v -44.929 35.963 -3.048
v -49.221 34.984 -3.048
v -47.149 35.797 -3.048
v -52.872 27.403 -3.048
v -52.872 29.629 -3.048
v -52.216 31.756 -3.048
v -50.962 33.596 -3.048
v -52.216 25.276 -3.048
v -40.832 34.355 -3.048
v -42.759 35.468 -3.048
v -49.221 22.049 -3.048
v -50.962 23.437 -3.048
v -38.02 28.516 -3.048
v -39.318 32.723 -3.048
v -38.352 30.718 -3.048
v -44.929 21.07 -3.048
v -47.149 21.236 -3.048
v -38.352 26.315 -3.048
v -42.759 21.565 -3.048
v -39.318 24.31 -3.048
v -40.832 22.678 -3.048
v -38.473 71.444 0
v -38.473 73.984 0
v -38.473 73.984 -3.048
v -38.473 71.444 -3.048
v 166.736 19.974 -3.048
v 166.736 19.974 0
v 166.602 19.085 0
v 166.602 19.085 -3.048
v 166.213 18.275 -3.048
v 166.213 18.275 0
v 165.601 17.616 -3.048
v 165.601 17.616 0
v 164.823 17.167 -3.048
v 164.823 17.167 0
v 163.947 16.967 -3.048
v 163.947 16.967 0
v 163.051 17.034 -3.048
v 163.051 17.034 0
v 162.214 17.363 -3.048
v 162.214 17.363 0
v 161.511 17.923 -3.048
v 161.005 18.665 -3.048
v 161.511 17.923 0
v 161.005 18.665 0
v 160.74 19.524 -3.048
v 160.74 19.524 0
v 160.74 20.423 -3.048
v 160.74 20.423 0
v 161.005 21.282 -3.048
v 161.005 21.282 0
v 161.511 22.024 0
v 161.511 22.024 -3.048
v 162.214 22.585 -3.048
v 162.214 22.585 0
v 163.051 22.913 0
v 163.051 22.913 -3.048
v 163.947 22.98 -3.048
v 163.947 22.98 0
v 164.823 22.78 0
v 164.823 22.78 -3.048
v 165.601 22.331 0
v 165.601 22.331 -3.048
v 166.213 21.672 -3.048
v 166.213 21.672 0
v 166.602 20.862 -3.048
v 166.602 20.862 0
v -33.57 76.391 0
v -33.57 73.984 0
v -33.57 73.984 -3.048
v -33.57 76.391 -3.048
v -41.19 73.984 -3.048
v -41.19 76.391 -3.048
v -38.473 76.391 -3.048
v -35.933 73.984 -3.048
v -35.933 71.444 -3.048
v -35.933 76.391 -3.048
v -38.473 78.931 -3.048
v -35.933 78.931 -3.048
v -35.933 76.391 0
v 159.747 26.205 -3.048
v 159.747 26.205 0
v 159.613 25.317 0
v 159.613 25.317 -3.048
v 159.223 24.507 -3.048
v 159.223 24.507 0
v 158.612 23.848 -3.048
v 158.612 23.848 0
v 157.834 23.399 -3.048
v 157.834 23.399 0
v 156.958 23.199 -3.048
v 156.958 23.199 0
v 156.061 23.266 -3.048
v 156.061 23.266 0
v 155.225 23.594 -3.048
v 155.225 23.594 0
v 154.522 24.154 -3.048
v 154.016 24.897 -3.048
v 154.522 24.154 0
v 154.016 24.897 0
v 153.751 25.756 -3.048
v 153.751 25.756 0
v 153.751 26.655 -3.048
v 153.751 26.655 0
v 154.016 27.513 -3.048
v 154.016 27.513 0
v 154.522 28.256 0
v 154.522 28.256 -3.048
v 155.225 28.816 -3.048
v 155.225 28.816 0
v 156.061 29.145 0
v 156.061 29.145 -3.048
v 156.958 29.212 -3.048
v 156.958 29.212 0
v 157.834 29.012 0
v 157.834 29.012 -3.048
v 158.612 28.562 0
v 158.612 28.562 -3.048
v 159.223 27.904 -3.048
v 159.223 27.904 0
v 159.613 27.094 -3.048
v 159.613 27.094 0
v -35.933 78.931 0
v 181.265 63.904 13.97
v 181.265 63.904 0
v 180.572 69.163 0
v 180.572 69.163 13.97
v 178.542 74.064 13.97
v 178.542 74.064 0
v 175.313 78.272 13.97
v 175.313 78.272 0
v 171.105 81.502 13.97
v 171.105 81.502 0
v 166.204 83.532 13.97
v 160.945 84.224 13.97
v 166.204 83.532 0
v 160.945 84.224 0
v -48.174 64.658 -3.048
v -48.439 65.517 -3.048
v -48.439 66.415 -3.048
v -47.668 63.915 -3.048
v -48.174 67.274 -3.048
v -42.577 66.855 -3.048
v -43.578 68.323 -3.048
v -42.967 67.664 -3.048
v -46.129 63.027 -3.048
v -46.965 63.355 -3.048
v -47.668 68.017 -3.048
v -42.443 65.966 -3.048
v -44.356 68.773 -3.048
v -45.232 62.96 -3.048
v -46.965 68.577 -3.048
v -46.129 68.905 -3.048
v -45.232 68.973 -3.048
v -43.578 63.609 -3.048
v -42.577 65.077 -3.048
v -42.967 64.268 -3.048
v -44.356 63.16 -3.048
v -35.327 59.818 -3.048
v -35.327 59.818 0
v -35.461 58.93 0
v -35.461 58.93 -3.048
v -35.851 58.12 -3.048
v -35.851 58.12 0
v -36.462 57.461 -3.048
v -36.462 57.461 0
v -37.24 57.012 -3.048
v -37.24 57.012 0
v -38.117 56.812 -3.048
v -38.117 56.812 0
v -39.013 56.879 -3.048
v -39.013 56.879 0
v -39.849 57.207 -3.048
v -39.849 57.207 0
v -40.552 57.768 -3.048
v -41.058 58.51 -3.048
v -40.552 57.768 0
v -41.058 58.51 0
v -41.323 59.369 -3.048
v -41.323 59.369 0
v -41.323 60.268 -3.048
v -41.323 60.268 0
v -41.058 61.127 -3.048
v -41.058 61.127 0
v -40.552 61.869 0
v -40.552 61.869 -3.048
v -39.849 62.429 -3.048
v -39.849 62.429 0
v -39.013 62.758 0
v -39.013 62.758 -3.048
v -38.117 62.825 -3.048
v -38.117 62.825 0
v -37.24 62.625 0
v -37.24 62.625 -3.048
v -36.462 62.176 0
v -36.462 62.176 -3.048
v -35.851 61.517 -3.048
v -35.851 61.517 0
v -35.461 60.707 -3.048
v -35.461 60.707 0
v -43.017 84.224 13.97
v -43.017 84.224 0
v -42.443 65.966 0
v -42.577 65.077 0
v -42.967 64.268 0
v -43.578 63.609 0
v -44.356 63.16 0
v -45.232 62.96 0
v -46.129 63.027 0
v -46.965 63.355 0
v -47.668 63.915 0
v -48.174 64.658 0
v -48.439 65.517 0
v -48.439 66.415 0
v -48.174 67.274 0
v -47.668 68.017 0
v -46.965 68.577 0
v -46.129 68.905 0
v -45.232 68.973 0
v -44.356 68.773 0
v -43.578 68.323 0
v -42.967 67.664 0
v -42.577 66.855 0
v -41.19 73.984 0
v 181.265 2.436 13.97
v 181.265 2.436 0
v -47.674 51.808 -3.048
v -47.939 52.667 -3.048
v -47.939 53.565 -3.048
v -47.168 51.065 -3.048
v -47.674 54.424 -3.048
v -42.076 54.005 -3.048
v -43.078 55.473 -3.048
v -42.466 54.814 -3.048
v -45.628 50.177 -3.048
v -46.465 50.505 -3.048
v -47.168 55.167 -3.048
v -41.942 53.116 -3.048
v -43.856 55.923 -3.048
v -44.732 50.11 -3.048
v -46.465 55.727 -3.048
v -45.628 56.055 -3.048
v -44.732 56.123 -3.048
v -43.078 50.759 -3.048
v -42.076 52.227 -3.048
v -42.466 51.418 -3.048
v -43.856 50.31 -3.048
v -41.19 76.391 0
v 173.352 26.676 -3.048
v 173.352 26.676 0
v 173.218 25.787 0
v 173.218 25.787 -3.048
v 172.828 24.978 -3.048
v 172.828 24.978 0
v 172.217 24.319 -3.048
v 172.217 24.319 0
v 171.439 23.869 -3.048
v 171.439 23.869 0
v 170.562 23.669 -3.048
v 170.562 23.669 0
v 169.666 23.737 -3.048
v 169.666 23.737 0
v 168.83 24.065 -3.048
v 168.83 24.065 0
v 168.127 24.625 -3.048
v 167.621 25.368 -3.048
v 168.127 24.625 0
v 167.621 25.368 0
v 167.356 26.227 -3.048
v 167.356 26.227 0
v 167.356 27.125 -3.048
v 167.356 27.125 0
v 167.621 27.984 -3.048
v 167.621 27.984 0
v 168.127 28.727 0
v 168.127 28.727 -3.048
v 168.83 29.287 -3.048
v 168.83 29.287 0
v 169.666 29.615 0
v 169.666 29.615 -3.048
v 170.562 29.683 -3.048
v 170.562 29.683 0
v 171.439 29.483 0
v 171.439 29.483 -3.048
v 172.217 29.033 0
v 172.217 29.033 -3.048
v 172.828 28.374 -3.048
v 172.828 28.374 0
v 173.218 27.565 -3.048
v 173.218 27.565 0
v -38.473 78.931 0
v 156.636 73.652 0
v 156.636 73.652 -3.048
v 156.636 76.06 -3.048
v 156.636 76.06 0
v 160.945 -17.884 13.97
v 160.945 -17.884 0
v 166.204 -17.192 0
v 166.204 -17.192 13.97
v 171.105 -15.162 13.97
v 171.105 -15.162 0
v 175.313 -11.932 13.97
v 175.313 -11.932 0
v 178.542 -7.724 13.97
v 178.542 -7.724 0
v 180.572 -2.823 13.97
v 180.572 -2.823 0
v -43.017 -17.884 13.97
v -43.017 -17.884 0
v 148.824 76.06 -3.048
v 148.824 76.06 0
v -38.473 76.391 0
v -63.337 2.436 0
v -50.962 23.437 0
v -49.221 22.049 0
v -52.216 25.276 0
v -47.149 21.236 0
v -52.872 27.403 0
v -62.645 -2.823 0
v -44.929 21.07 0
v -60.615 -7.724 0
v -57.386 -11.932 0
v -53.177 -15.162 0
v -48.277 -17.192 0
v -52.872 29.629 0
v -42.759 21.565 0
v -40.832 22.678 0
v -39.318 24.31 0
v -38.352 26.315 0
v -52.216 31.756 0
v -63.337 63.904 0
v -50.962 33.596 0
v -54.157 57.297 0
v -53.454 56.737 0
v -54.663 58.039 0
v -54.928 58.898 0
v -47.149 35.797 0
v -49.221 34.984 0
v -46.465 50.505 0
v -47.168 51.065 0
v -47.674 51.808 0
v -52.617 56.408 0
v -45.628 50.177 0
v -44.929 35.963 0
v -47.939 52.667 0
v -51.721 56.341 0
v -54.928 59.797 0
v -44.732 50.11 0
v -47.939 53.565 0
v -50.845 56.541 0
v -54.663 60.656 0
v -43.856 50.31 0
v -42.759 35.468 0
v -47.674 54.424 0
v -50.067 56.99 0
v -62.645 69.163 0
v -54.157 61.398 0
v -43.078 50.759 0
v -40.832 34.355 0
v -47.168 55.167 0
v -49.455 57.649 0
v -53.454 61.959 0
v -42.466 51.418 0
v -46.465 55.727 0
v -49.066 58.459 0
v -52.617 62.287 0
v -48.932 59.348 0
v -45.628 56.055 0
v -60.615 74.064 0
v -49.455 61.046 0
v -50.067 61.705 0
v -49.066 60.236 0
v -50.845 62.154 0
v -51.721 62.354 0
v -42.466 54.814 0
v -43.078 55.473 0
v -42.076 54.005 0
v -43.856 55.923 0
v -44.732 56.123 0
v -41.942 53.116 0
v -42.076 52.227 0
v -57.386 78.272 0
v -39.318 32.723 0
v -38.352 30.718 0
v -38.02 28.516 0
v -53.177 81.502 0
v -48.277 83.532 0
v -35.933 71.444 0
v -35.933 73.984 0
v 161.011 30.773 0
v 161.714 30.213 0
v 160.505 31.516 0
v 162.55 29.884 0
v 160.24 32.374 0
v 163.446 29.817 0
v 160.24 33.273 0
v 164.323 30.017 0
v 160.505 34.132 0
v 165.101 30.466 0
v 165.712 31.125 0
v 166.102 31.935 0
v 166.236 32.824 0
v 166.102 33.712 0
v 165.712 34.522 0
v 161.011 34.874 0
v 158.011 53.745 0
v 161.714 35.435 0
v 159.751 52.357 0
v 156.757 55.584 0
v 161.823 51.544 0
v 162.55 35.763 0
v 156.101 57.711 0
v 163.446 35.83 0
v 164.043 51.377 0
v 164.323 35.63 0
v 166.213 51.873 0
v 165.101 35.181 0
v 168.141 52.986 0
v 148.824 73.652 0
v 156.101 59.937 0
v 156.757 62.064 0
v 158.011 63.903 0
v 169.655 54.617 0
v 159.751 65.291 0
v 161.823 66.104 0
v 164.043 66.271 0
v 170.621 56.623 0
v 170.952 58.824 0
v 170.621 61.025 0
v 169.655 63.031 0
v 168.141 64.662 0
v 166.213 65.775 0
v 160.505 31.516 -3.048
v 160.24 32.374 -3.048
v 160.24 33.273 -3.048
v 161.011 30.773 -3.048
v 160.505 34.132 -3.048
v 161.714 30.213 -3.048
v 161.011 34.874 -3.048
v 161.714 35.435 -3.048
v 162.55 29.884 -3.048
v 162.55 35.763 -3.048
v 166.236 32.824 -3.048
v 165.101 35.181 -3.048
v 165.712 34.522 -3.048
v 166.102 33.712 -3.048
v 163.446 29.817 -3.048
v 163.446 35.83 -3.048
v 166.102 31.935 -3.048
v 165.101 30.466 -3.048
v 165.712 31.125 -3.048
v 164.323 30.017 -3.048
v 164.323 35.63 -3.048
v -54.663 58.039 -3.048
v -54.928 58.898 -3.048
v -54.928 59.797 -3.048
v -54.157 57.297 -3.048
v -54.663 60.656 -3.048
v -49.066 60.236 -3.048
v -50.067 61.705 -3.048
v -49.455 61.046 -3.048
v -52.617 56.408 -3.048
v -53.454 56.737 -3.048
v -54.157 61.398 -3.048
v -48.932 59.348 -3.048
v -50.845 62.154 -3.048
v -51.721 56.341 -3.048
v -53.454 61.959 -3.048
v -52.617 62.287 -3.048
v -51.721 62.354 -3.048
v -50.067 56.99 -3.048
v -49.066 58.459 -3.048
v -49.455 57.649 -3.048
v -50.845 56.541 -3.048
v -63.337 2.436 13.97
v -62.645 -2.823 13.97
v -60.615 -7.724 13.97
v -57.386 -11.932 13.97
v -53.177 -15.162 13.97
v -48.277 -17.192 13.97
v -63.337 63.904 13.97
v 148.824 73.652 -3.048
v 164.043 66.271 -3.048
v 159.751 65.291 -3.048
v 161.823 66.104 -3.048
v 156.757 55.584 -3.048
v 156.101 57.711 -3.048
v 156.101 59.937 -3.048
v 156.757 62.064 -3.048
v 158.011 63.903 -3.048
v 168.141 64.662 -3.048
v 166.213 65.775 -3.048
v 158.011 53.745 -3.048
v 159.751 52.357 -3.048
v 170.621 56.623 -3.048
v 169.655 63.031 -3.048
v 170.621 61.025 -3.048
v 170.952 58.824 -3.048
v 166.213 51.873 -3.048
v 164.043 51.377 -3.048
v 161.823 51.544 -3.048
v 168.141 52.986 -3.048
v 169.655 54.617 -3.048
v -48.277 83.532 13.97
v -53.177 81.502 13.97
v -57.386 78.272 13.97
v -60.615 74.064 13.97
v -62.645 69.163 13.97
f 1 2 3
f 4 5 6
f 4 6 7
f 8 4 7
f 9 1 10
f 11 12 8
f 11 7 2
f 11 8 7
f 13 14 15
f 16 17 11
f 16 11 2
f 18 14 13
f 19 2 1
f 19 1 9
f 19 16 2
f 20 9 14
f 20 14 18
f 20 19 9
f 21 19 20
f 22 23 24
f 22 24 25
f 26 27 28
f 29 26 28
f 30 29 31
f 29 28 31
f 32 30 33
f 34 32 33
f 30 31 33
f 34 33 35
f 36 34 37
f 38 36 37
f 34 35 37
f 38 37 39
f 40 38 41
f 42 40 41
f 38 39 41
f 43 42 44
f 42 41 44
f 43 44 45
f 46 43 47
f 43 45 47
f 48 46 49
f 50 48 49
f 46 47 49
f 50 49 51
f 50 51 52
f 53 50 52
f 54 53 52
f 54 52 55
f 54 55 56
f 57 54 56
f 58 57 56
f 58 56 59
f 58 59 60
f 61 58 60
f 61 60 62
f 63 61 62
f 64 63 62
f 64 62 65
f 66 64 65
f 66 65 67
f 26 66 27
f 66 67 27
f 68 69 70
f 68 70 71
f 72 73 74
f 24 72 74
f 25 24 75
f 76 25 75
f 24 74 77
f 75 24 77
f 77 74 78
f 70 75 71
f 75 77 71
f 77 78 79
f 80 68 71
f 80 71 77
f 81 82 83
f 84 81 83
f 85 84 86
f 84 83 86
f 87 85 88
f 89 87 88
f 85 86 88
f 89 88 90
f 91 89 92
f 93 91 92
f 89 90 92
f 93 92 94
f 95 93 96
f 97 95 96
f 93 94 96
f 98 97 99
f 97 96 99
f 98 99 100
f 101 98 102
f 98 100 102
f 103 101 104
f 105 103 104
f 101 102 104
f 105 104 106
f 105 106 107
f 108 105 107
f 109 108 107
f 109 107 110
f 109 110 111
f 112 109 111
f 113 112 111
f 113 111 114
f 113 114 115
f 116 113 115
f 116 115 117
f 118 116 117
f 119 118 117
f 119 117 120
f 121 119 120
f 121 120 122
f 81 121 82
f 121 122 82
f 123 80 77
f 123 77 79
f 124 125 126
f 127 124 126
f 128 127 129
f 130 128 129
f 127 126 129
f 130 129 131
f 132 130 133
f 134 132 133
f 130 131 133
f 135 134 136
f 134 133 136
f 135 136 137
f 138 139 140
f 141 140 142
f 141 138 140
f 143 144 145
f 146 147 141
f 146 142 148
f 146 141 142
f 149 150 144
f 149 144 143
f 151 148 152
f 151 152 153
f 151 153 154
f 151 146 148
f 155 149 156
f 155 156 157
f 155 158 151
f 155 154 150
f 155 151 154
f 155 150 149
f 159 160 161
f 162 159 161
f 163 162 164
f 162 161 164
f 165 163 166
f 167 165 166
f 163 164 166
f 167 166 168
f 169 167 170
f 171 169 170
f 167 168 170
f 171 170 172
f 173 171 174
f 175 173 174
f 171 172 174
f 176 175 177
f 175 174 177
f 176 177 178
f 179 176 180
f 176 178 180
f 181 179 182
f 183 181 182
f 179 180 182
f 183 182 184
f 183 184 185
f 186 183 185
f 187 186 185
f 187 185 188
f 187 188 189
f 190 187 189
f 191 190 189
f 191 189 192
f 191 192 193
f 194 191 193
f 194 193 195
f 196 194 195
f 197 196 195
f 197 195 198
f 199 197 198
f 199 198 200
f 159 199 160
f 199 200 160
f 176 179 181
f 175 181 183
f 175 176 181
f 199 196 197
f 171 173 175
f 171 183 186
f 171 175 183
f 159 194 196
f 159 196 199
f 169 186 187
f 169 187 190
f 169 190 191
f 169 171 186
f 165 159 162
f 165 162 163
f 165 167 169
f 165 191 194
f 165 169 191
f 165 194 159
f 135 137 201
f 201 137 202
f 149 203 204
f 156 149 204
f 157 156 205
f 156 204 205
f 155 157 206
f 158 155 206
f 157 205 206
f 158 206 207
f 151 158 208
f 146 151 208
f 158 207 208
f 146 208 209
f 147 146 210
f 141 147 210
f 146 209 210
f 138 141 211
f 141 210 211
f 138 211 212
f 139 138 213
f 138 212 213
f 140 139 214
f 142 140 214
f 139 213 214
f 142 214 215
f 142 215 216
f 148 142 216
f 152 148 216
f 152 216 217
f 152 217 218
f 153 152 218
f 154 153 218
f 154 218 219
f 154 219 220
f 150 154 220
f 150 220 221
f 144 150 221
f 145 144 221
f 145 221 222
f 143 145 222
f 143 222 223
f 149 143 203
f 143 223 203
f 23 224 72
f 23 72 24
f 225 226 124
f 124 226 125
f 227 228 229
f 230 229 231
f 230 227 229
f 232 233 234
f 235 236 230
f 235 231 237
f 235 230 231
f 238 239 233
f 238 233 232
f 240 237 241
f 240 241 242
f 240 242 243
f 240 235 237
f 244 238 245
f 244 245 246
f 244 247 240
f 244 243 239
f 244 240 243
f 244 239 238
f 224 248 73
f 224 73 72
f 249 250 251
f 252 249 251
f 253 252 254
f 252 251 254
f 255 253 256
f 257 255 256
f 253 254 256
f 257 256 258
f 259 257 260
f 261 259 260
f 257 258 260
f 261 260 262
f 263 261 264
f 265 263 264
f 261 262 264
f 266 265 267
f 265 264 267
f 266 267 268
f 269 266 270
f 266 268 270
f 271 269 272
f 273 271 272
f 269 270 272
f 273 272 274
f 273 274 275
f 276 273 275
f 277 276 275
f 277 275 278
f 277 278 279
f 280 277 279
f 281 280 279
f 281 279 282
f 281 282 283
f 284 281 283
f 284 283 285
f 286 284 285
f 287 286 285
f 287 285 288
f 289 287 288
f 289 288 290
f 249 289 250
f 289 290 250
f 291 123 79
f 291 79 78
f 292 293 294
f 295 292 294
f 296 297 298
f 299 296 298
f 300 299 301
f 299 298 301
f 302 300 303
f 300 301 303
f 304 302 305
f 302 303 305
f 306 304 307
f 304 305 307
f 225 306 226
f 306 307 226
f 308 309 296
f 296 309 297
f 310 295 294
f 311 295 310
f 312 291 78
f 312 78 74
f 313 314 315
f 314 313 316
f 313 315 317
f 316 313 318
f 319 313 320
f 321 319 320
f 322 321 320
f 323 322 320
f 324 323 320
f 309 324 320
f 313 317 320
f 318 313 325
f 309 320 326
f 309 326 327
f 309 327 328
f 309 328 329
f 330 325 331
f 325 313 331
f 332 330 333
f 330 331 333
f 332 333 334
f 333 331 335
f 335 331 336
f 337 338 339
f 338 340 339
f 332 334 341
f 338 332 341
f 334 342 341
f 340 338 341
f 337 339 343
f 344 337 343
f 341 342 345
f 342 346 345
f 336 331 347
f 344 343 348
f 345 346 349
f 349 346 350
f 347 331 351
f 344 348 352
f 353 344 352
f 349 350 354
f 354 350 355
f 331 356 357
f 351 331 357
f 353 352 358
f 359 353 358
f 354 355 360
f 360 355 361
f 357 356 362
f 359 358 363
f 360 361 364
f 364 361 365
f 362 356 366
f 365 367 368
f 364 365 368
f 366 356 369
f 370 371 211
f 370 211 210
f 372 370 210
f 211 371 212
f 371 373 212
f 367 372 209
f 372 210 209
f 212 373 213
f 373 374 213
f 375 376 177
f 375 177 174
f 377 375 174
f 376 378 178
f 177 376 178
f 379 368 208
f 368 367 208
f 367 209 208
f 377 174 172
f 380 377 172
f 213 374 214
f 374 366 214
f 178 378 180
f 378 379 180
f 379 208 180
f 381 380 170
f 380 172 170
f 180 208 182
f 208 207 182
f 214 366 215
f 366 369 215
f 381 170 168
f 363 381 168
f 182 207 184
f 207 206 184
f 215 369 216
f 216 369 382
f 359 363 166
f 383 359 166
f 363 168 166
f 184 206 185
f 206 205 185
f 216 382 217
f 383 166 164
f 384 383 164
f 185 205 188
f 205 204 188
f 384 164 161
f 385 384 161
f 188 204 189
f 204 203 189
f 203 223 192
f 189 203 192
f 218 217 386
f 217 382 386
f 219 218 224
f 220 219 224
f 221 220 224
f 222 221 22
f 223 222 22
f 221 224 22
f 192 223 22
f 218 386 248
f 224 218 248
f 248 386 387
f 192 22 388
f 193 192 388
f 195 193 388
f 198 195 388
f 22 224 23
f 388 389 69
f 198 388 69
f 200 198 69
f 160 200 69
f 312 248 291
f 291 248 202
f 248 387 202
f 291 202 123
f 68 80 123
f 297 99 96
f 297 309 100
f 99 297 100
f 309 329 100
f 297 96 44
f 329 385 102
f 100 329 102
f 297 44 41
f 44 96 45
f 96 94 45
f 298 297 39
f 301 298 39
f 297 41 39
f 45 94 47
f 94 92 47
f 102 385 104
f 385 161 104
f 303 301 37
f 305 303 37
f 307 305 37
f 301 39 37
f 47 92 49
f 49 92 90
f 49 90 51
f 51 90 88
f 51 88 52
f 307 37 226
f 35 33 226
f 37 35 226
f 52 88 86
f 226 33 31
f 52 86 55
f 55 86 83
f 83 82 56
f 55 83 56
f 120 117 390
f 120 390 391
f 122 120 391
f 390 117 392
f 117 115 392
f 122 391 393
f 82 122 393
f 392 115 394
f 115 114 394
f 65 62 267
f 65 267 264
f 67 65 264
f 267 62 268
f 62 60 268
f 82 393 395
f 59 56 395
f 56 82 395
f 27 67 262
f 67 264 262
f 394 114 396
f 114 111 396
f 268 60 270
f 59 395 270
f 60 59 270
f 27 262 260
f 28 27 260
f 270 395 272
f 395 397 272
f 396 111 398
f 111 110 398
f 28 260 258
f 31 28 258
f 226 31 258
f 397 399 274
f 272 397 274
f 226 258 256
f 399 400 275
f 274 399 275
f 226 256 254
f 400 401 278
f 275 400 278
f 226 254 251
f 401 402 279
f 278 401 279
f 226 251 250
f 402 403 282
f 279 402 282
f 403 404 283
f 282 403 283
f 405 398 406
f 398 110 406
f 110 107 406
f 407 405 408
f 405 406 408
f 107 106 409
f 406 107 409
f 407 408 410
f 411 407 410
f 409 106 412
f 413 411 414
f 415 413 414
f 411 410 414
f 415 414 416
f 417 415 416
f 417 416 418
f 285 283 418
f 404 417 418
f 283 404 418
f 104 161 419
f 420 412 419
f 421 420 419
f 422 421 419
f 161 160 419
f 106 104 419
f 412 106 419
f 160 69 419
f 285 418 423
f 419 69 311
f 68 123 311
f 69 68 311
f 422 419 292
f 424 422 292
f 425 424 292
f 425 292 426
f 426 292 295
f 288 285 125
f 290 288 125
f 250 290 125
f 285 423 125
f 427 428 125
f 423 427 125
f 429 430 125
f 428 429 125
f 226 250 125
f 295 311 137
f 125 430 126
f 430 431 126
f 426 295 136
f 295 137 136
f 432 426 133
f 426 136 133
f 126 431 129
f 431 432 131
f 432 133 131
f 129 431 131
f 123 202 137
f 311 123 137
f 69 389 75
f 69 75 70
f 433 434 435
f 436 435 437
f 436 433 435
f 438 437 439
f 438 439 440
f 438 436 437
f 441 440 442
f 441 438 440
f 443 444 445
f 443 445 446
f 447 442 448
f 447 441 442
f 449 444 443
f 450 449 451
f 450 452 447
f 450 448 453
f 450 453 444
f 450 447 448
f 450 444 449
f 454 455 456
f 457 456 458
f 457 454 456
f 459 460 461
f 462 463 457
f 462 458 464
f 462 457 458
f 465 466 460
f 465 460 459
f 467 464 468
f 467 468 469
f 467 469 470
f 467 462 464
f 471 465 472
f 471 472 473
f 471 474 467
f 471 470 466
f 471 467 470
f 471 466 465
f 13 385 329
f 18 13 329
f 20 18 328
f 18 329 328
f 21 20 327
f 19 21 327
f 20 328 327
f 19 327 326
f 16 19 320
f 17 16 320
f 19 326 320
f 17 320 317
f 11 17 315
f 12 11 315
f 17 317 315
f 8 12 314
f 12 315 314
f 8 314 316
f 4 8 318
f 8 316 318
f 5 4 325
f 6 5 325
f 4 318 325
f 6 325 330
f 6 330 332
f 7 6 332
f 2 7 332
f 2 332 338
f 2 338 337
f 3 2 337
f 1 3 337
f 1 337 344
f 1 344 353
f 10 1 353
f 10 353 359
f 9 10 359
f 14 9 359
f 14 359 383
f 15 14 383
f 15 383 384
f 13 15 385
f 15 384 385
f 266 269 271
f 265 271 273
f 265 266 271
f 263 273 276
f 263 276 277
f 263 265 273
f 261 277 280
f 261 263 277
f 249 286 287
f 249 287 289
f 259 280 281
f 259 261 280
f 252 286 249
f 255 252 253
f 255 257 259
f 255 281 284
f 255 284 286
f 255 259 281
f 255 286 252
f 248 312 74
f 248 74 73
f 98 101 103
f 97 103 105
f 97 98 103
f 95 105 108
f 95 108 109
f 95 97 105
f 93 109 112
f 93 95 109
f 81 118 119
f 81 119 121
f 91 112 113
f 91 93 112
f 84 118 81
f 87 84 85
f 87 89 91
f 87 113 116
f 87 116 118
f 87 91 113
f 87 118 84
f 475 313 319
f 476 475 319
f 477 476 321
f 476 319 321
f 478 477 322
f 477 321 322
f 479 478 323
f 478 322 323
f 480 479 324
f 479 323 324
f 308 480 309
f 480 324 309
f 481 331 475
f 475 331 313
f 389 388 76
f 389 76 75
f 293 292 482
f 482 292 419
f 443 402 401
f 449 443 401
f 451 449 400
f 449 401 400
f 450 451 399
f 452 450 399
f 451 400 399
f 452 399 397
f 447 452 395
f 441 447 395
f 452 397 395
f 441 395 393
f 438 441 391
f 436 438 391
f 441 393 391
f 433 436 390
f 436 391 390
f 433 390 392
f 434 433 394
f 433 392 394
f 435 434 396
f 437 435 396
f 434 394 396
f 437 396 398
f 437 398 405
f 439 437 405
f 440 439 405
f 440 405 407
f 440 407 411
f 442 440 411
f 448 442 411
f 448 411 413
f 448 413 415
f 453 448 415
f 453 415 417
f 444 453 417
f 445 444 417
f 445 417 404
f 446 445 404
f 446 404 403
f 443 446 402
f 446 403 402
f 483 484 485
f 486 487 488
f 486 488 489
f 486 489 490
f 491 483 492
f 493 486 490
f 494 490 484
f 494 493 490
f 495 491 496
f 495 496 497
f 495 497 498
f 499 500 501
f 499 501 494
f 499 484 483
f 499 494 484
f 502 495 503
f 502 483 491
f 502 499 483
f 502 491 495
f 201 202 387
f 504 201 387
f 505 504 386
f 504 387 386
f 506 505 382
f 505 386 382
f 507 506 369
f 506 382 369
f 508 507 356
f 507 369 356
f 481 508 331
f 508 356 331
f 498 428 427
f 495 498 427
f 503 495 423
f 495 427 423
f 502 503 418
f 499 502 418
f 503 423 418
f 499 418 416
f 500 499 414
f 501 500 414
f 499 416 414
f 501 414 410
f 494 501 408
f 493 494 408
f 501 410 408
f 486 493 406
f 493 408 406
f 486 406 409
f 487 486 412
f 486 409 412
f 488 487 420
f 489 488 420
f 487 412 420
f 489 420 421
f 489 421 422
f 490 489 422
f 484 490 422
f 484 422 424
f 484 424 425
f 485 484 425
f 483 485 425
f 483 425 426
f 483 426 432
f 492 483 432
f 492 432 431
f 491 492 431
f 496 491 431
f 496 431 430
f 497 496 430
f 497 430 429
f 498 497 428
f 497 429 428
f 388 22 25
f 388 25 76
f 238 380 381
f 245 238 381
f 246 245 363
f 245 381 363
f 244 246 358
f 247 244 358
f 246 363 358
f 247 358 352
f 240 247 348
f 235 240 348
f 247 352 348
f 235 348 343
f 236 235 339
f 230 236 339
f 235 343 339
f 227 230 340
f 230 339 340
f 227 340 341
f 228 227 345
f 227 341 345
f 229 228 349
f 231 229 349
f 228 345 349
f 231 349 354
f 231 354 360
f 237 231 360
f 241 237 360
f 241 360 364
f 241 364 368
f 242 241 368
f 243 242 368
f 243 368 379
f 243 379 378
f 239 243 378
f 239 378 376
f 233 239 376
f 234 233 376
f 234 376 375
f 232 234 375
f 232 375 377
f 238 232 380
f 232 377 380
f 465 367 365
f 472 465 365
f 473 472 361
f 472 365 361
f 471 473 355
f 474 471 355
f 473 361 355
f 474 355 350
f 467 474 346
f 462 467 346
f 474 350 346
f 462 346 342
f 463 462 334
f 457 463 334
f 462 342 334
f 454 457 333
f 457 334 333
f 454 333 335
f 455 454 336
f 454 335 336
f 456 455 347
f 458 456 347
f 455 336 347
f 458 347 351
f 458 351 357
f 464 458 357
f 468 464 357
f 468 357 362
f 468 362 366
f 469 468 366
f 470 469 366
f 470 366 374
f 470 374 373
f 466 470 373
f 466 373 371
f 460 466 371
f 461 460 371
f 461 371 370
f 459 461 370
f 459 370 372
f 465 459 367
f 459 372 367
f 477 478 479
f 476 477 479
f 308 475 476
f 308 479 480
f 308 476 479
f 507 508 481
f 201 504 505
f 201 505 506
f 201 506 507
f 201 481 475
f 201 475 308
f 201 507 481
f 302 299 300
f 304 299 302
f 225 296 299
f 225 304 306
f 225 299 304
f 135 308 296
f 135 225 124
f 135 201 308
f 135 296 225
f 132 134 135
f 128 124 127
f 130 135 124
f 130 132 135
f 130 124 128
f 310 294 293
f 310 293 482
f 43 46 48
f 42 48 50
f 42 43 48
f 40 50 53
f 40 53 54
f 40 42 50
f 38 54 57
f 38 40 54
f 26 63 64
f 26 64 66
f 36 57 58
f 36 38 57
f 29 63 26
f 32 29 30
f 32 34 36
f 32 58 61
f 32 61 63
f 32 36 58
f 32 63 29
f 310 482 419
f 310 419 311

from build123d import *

# Parameters (mm, degrees)
SKETCH1_W           = 172.974
SKETCH1_H           = 102.108
BOSS_EXTRUDE1_DEPTH = 13.97
SKETCH2_R           = 7.4676
SKETCH2_R_2         = 3.014975044
SKETCH2_W           = 7.81218406
SKETCH2_H           = 2.407827673
BOSS_EXTRUDE3_DEPTH = 3.048
SKETCH3_R           = 7.4676
SKETCH3_R_2         = 3.014975044
BOSS_EXTRUDE5_DEPTH = 3.048


with BuildPart() as part:
    # Sketch1 → Boss-Extrude1 (new body)
    with BuildSketch(Plane.XY):
        with Locations((58.9637029, 33.169946412)):
            Rectangle(SKETCH1_W, SKETCH1_H)
        with BuildLine():
            Line((-27.5232971, 84.223946412), (-43.0172971, 84.223946412))
            ThreePointArc((-43.0172971, 84.223946412), (-57.385706894, 78.272356205), (-63.3372971, 63.903946412))
            Line((-63.3372971, 63.903946412), (-63.3372971, 2.435946412))
            ThreePointArc((-63.3372971, 2.435946412), (-57.385706894, -11.932463382), (-43.0172971, -17.884053588))
            Line((-43.0172971, -17.884053588), (-27.5232971, -17.884053588))
            Line((-27.5232971, -17.884053588), (-27.5232971, 84.223946412))
        make_face()
        with BuildLine():
            Line((160.9447029, 84.223946412), (145.4507029, 84.223946412))
            Line((145.4507029, 84.223946412), (145.4507029, -17.884053588))
            Line((145.4507029, -17.884053588), (160.9447029, -17.884053588))
            ThreePointArc((160.9447029, -17.884053588), (175.313112694, -11.932463382), (181.2647029, 2.435946412))
            Line((181.2647029, 2.435946412), (181.2647029, 63.903946412))
            ThreePointArc((181.2647029, 63.903946412), (175.313112694, 78.272356205), (160.9447029, 84.223946412))
        make_face()
    extrude(amount=BOSS_EXTRUDE1_DEPTH)

    # Sketch2 → Boss-Extrude3 (add)
    with BuildSketch(Plane(origin=(0, 0, 0), x_dir=(-1, 0, 0), z_dir=(0, 0, -1))):
        with Locations(Location((-163.4847029, 58.823946412, 0), (0, 0, 180))):
            Circle(SKETCH2_R)
        with Locations(Location((-170.337090886, 26.676001086, 0), (0, 0, 180))):
            Circle(SKETCH2_R_2)
        with Locations(Location((-163.221177768, 32.823656386, 0), (0, 0, 180))):
            Circle(SKETCH2_R_2)
        with Locations(Location((-156.732358191, 26.205188985, 0), (0, 0, 180))):
            Circle(SKETCH2_R_2)
        with Locations(Location((-163.721455714, 19.973644896, 0), (0, 0, 180))):
            Circle(SKETCH2_R_2)
        with Locations((-152.730393721, 74.856056835)):
            Rectangle(SKETCH2_W, SKETCH2_H)
    extrude(amount=BOSS_EXTRUDE3_DEPTH)

    # Sketch3 → Boss-Extrude5 (add)
    with BuildSketch(Plane(origin=(0, 0, 0), x_dir=(-1, 0, 0), z_dir=(0, 0, -1))):
        with Locations(Location((45.487523866, 28.516423037, 0), (0, 0, 180))):
            Circle(SKETCH3_R)
        with Locations(Location((44.957454366, 53.116068624, 0), (0, 0, 180))):
            Circle(SKETCH3_R_2)
        with Locations(Location((38.341819194, 59.818424813, 0), (0, 0, 180))):
            Circle(SKETCH3_R_2)
        with Locations(Location((45.457732312, 65.966080113, 0), (0, 0, 180))):
            Circle(SKETCH3_R_2)
        with Locations(Location((51.94655189, 59.347612713, 0), (0, 0, 180))):
            Circle(SKETCH3_R_2)
        Polygon((38.47340824, 76.391412748), (41.190295926, 76.391412748), (41.190295926, 73.983585075), (38.47340824, 73.983585075), (38.47340824, 71.443585075), (35.93340824, 71.443585075), (35.93340824, 73.983585075), (33.570295926, 73.983585075), (33.570295926, 76.391412748), (35.93340824, 76.391412748), (35.93340824, 78.931412748), (38.47340824, 78.931412748), align=None)
    extrude(amount=BOSS_EXTRUDE5_DEPTH)


solid = part.part
